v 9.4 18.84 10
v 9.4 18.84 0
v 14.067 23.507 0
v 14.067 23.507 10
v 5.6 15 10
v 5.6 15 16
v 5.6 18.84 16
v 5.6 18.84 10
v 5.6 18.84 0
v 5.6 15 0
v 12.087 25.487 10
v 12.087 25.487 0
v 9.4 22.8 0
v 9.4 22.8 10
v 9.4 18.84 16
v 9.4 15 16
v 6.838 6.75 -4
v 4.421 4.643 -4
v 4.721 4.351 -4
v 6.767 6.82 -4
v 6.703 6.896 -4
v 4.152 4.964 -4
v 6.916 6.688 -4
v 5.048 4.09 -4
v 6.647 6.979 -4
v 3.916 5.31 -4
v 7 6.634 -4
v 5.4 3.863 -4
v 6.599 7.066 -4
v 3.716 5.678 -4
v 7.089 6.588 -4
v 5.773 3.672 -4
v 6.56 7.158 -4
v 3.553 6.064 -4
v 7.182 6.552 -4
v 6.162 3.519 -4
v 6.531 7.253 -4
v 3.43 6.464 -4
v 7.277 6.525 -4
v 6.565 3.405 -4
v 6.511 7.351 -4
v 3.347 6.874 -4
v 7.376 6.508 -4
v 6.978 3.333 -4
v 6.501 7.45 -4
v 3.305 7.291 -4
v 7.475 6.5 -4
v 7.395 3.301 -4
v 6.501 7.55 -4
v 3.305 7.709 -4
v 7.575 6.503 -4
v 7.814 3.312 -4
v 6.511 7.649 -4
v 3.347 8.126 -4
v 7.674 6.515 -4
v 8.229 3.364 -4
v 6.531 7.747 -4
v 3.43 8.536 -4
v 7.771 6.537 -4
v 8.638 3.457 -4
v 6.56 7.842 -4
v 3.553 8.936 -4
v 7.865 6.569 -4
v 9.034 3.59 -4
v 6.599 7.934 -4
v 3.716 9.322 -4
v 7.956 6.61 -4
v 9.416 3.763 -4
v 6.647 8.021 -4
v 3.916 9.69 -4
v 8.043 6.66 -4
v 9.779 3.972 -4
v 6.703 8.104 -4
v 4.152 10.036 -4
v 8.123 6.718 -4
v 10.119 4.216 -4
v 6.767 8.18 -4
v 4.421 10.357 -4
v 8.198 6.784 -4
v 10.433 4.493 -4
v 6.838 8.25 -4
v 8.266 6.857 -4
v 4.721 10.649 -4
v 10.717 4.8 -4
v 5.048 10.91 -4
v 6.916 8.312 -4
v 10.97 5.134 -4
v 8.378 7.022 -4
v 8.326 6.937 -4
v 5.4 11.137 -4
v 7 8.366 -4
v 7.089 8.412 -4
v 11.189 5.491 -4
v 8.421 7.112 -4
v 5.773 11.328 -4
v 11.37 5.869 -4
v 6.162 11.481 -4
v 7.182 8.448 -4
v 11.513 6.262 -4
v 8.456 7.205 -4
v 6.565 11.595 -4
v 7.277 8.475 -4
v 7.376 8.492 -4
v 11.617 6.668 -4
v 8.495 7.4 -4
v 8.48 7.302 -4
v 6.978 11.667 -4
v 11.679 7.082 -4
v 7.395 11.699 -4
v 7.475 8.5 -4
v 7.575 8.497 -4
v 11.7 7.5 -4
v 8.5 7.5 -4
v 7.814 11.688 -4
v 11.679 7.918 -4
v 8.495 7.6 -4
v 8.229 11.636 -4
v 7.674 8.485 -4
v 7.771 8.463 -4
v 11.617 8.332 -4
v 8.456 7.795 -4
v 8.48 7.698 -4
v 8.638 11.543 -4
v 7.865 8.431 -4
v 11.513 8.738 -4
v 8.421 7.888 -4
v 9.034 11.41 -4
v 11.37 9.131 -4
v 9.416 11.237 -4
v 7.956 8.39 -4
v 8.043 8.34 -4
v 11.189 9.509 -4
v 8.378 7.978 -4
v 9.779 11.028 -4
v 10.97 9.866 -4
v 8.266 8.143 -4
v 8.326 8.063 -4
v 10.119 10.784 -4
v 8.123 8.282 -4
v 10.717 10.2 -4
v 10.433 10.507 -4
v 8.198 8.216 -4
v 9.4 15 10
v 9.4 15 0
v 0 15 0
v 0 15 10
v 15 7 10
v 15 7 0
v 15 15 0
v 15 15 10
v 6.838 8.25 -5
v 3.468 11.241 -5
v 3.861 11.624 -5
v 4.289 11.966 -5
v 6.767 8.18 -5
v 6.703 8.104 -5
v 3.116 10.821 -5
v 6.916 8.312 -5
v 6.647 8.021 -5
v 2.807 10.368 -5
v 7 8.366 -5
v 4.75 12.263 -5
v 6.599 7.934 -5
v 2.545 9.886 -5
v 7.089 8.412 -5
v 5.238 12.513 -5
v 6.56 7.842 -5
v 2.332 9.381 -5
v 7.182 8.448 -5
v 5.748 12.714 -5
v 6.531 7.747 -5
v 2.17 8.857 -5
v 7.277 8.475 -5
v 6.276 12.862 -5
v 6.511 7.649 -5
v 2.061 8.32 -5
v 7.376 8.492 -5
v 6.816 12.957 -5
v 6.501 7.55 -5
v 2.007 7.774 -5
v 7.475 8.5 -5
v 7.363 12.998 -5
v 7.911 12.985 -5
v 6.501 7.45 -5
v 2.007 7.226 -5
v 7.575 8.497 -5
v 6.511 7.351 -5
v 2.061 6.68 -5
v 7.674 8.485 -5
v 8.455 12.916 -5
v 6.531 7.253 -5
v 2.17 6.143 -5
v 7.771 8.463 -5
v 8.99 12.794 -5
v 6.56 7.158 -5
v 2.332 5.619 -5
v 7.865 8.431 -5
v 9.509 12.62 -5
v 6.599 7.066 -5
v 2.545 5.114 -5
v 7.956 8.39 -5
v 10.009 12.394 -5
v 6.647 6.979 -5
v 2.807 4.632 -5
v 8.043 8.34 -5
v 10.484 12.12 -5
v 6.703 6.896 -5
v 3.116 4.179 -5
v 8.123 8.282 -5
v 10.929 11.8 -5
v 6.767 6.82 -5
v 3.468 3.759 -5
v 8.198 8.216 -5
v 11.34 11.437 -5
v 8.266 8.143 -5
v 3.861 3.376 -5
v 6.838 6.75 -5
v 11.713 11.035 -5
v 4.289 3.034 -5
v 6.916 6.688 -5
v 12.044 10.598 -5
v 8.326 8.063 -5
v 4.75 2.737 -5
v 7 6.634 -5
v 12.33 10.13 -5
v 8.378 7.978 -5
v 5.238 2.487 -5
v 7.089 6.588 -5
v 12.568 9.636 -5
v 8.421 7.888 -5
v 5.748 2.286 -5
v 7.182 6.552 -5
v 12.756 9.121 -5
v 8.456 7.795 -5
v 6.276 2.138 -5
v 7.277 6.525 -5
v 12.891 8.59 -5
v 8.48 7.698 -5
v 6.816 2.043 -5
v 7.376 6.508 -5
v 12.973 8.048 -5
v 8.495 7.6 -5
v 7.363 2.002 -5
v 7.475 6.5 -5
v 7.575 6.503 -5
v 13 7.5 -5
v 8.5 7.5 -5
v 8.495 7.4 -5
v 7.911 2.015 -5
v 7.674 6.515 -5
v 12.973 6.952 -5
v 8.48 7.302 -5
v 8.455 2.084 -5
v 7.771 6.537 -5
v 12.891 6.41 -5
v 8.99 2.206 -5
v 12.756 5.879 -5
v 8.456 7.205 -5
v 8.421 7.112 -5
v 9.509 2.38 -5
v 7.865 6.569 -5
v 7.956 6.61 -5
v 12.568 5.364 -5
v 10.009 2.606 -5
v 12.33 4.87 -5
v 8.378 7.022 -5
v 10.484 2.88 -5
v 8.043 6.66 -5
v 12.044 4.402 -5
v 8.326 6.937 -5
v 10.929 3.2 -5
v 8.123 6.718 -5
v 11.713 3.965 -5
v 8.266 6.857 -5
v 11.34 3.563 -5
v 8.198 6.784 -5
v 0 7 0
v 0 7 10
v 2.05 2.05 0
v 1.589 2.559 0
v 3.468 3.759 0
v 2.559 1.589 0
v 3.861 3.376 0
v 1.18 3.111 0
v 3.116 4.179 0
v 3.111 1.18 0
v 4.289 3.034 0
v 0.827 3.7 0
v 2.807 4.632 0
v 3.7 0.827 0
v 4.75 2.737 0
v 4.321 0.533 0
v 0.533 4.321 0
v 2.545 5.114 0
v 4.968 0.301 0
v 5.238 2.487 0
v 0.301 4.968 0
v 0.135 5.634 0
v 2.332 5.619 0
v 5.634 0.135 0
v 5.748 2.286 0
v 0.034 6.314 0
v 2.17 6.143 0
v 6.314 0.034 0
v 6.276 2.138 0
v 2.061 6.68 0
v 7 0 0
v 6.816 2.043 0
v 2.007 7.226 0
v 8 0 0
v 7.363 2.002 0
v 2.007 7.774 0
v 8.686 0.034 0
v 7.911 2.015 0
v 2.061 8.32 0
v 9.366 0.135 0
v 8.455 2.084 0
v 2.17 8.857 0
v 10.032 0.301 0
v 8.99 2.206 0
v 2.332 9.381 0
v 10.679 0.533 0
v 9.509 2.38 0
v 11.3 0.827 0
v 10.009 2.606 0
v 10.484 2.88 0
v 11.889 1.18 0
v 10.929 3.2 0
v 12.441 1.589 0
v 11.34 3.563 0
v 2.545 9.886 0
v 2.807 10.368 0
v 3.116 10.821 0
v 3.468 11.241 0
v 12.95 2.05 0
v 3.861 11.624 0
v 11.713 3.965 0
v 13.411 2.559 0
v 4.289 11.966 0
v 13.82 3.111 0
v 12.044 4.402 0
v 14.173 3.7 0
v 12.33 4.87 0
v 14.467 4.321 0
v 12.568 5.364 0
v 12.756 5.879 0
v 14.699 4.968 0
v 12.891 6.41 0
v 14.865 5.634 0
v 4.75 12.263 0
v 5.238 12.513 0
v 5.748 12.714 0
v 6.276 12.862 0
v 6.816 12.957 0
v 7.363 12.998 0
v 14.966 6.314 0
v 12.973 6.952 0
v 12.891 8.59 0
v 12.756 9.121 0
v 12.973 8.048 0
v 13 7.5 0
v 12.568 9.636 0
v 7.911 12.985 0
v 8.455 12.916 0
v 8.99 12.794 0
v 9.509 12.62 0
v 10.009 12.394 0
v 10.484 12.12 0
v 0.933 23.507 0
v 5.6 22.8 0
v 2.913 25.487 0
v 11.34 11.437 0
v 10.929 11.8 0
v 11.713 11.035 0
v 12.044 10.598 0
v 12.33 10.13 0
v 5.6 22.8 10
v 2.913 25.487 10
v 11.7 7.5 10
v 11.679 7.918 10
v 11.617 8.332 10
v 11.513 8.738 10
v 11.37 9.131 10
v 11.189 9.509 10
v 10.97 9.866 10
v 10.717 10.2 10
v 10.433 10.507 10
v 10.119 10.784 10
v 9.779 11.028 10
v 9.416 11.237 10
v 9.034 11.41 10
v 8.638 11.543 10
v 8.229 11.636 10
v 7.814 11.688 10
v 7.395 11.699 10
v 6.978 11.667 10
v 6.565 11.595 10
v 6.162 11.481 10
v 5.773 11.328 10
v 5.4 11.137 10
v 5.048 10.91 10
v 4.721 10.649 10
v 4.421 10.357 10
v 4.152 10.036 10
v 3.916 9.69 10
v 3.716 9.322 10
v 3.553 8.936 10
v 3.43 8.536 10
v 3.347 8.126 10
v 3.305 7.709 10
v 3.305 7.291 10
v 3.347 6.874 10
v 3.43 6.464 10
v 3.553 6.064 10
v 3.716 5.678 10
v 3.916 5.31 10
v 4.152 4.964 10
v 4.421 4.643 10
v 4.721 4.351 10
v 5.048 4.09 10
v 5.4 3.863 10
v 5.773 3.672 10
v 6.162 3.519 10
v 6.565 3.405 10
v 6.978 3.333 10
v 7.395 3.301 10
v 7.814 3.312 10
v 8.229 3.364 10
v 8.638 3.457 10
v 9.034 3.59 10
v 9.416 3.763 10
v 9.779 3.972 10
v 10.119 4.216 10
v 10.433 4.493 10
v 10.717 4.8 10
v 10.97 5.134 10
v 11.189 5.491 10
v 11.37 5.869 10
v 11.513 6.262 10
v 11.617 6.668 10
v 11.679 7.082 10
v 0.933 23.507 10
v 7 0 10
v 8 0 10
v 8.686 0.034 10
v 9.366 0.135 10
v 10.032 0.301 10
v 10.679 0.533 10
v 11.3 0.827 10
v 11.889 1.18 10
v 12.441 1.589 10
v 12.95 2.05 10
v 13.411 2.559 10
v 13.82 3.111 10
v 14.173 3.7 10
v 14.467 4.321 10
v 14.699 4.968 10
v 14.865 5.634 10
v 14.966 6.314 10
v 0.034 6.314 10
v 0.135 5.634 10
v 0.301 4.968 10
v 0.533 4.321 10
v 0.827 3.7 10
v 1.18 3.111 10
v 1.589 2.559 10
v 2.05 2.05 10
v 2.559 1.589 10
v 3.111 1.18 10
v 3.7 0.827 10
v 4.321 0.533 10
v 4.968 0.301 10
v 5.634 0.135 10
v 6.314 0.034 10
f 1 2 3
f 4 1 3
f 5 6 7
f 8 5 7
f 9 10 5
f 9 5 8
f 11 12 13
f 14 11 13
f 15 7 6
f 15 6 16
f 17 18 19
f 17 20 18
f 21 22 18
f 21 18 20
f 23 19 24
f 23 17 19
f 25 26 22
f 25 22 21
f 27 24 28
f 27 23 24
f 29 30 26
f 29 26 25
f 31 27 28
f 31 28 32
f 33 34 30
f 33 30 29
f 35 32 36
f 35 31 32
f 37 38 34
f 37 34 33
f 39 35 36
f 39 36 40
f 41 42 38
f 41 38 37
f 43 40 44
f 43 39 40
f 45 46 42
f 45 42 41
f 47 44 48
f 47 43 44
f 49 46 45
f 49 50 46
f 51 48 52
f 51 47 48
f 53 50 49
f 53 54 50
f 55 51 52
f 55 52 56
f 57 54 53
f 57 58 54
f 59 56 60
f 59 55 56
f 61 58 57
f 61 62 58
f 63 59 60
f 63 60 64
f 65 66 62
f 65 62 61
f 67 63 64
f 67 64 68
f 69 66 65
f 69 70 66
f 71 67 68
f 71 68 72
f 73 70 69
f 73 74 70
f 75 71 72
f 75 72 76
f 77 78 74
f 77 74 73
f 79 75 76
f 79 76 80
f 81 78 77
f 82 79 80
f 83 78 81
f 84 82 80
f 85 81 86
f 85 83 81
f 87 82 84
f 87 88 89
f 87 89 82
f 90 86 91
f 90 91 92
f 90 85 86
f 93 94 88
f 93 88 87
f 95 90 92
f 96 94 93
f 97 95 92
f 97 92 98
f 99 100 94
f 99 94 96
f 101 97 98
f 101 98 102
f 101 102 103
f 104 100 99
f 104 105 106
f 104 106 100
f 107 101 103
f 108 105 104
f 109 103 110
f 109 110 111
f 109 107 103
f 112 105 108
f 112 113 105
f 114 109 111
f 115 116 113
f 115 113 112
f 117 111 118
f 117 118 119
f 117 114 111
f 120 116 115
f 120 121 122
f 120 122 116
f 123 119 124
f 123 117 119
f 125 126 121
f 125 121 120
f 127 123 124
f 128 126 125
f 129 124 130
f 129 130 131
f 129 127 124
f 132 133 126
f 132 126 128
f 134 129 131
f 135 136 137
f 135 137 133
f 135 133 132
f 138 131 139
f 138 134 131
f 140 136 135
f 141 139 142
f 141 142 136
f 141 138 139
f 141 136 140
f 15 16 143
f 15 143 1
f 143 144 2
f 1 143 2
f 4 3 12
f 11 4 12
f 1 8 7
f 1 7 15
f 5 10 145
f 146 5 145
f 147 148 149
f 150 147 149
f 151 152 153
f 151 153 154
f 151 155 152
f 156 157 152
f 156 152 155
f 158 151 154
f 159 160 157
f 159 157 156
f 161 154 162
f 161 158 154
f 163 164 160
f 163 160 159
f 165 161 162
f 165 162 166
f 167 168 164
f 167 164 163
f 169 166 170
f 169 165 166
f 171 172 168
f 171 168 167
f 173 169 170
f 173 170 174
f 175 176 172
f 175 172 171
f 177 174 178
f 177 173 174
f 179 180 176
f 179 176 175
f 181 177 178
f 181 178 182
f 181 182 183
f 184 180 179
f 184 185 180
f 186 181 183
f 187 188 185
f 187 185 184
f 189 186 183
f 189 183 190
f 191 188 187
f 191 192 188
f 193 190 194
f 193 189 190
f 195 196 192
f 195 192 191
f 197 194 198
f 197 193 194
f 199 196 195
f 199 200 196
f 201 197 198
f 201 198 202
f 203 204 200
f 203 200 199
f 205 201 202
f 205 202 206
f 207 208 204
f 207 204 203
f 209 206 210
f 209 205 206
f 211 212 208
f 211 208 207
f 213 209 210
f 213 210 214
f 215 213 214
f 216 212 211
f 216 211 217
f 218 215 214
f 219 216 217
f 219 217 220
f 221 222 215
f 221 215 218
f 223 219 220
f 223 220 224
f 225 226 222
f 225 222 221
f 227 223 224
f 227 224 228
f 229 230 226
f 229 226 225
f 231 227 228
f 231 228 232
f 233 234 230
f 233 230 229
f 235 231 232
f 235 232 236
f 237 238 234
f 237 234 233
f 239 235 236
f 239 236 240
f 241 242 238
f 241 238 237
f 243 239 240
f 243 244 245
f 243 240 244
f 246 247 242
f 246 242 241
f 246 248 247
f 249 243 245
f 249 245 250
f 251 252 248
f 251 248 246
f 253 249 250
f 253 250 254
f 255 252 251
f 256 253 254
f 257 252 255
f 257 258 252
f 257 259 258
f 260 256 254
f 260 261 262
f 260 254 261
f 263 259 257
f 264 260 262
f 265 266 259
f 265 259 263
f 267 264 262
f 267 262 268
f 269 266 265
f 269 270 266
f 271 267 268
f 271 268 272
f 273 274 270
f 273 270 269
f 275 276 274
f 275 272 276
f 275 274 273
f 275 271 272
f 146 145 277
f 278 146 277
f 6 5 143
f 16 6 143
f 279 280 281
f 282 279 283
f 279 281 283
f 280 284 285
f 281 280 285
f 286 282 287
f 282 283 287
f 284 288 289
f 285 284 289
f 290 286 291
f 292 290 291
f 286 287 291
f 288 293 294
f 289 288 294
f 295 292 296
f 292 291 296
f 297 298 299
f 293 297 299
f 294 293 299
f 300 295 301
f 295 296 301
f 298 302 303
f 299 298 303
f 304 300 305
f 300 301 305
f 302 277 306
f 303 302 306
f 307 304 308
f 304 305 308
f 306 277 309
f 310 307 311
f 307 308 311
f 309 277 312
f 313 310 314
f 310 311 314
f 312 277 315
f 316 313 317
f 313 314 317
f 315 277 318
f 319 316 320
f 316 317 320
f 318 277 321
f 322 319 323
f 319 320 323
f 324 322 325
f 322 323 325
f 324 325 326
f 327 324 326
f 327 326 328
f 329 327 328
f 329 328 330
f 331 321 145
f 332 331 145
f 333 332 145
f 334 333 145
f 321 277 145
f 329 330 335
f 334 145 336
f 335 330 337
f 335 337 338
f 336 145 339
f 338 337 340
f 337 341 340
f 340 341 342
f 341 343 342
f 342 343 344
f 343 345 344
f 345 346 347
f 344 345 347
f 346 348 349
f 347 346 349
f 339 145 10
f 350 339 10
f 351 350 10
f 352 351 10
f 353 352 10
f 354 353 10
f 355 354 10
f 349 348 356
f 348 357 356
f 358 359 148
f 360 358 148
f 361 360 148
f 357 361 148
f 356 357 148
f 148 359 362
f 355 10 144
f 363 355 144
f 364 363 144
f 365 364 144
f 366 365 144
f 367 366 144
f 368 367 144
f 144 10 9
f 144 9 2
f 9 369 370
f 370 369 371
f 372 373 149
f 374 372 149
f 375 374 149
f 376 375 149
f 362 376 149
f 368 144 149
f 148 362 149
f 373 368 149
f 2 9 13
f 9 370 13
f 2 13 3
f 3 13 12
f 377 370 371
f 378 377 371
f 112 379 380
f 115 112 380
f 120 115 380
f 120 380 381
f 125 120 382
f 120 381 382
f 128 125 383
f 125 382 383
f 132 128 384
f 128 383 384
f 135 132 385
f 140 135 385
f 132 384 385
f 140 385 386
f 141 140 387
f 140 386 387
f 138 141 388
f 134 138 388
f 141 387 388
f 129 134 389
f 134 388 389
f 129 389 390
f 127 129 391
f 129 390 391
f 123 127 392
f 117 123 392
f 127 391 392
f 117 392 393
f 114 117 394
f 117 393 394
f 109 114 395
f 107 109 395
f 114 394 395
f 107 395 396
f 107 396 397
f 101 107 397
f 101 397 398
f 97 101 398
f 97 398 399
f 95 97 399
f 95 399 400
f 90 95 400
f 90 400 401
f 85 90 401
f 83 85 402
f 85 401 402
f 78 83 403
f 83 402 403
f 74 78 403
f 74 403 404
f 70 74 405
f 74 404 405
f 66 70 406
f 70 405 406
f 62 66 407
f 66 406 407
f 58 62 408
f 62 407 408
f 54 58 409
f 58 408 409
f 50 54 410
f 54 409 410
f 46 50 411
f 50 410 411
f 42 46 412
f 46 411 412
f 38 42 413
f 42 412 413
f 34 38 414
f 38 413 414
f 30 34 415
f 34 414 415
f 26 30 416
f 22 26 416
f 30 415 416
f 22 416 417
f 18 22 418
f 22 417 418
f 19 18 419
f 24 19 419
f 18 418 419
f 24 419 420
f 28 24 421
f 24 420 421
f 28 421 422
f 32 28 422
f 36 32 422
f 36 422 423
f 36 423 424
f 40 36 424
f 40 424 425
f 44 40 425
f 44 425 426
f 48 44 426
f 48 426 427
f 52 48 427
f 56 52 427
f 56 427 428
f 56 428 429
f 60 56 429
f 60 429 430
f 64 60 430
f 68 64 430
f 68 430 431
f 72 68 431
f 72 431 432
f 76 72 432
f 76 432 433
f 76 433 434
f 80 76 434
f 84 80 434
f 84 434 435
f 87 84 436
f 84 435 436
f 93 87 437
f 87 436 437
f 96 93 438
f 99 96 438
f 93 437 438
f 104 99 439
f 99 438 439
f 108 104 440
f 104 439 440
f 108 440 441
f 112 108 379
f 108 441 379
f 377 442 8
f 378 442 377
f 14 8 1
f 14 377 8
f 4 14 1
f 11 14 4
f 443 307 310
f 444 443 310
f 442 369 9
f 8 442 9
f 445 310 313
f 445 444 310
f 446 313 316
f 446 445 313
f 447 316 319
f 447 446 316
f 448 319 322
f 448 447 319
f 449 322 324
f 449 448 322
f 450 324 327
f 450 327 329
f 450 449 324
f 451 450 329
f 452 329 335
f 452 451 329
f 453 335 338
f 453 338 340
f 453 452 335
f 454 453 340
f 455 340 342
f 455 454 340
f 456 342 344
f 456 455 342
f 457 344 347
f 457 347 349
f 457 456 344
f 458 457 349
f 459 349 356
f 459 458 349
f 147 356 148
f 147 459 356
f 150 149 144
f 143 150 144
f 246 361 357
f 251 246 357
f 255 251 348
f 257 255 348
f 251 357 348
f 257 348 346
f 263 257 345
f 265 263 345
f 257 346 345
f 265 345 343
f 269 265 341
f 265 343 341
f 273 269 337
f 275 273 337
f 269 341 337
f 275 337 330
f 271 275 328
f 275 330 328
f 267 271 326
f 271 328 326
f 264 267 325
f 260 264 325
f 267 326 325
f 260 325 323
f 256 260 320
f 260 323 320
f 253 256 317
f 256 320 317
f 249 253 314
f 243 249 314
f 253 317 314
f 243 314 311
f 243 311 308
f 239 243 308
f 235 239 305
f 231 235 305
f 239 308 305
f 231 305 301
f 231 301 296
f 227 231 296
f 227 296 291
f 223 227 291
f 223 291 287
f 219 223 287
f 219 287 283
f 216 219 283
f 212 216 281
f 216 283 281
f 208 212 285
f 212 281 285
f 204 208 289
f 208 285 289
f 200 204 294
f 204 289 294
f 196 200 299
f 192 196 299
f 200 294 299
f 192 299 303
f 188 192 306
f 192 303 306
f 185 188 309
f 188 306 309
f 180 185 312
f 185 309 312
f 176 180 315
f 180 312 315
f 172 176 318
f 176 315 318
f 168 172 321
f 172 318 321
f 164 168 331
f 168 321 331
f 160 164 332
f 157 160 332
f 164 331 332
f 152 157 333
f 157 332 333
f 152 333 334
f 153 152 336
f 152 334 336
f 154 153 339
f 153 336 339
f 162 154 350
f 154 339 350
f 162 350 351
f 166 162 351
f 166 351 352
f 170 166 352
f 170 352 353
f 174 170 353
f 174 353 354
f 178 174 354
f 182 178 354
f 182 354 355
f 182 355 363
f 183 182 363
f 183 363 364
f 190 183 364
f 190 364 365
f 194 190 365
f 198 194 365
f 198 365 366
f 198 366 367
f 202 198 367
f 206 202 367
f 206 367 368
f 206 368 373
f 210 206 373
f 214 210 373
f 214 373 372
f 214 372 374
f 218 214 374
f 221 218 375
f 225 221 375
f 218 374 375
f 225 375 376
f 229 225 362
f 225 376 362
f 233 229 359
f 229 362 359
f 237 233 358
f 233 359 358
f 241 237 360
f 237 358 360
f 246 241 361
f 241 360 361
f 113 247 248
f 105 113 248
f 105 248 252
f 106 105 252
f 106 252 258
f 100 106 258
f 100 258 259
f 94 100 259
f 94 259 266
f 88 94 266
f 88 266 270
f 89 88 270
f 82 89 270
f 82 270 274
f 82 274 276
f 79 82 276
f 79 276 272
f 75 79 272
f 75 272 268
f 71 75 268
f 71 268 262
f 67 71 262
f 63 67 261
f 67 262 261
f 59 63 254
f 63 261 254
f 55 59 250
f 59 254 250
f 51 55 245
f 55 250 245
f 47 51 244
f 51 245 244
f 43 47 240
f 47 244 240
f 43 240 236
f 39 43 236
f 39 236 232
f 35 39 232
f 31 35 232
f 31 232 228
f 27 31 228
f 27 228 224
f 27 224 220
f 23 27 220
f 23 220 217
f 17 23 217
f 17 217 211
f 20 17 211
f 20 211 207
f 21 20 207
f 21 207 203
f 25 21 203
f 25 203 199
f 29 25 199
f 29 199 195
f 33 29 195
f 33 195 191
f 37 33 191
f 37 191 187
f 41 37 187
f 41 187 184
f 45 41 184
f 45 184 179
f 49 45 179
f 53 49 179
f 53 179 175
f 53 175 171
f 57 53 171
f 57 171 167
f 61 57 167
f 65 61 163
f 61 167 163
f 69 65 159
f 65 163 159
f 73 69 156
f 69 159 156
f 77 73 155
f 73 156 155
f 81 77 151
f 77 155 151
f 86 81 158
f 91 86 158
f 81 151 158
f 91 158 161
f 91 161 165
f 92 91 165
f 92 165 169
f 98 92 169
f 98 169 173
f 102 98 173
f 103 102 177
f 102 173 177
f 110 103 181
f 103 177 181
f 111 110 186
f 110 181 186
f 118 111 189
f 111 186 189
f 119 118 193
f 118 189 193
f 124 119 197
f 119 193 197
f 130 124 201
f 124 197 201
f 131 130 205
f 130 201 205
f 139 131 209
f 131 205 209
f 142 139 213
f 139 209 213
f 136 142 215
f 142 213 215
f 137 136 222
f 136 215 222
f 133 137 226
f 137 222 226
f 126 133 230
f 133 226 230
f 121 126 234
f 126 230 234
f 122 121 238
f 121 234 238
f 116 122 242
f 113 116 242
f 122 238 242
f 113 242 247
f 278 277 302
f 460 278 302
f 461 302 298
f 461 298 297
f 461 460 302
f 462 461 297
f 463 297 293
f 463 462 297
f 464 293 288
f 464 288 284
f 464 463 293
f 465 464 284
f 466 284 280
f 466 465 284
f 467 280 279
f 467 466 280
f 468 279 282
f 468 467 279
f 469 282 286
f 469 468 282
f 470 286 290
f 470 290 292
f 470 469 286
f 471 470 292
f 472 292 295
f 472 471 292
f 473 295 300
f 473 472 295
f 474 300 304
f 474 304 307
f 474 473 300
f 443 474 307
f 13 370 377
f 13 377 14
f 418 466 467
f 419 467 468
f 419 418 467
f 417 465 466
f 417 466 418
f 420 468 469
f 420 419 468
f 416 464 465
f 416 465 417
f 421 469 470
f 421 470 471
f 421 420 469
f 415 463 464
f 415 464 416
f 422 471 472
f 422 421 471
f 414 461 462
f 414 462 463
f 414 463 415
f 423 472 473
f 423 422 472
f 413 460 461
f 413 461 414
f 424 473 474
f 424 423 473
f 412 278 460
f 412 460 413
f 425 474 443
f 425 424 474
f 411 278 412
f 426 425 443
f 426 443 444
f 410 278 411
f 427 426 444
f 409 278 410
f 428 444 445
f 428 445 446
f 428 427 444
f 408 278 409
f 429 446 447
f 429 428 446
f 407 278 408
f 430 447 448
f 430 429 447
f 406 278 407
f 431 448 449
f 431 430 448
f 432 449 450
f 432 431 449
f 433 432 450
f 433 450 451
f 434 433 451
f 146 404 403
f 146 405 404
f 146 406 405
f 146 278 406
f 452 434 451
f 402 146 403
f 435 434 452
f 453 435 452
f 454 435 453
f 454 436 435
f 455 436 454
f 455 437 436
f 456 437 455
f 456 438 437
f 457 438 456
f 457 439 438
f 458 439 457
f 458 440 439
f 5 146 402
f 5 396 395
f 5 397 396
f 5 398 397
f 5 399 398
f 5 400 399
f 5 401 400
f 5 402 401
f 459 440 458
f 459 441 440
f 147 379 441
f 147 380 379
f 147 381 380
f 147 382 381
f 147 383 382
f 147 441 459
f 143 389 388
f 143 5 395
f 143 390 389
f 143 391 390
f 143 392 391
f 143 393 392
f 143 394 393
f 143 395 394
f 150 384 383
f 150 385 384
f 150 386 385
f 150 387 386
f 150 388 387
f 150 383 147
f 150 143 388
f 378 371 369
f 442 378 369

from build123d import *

# Parameters (mm, degrees)
F0_W     = 3.8
F0_H     = 3.840202
F0_H_2   = 3.959798
F1_DEPTH = 10
F2_W     = 3.8
F2_H     = 3.840202
F3_DEPTH = 6
F4_R     = 5.5
F5_DEPTH = 5
F6_R     = 1
F7_DEPTH = 25
F8_R     = 4.2
F9_DEPTH = 14
F10_R    = 7


with BuildPart() as f1:
    # F0 (on Top) → F1 (new body)
    with BuildSketch(Plane.XY):
        Polygon((0, 15), (0, 0), (15, 0), (15, 15), (9.4, 15), (5.6, 15), align=None)
        with Locations((7.5, 16.920101)):
            Rectangle(F0_W, F0_H)
        with Locations((7.5, 20.820101)):
            Rectangle(F0_W, F0_H_2)
        Polygon((9.4, 22.8), (9.4, 18.840202), (14.066905, 23.507107), (12.087006, 25.487006), align=None)
        Polygon((0.933095, 23.507107), (5.6, 18.840202), (5.6, 22.8), (2.912994, 25.487006), align=None)
    extrude(amount=F1_DEPTH)

    # F2 (on face) → F3 (join)
    with BuildSketch(Plane.XY.offset(10)):
        with Locations((7.5, 16.920101)):
            Rectangle(F2_W, F2_H)
    extrude(amount=F3_DEPTH)

    # F4 (on face) → F5 (join)
    with BuildSketch(Plane(origin=(0, 0, 0), x_dir=(1, 0, 0), z_dir=(0, 0, -1))):
        with Locations((7.5, -7.5)):
            Circle(F4_R)
    extrude(amount=F5_DEPTH)

    # F6 (on face) → F7 (cut)
    with BuildSketch(Plane(origin=(0, 0, -5), x_dir=(1, 0, 0), z_dir=(0, 0, -1))):
        with Locations((7.5, -7.5)):
            Circle(F6_R)
    extrude(amount=-F7_DEPTH, mode=Mode.SUBTRACT)

    # F8 (on face) → F9 (cut)
    with BuildSketch(Plane.XY.offset(10)):
        with Locations((7.5, 7.5)):
            Circle(F8_R)
    extrude(amount=-F9_DEPTH, mode=Mode.SUBTRACT)

    # F10
    f10_edges = [f1.edges().sort_by_distance(p)[0] for p in [
        (15, 0, 5),
        (0, 0, 5),
    ]]
    fillet(f10_edges, radius=F10_R)


solid = f1.part
